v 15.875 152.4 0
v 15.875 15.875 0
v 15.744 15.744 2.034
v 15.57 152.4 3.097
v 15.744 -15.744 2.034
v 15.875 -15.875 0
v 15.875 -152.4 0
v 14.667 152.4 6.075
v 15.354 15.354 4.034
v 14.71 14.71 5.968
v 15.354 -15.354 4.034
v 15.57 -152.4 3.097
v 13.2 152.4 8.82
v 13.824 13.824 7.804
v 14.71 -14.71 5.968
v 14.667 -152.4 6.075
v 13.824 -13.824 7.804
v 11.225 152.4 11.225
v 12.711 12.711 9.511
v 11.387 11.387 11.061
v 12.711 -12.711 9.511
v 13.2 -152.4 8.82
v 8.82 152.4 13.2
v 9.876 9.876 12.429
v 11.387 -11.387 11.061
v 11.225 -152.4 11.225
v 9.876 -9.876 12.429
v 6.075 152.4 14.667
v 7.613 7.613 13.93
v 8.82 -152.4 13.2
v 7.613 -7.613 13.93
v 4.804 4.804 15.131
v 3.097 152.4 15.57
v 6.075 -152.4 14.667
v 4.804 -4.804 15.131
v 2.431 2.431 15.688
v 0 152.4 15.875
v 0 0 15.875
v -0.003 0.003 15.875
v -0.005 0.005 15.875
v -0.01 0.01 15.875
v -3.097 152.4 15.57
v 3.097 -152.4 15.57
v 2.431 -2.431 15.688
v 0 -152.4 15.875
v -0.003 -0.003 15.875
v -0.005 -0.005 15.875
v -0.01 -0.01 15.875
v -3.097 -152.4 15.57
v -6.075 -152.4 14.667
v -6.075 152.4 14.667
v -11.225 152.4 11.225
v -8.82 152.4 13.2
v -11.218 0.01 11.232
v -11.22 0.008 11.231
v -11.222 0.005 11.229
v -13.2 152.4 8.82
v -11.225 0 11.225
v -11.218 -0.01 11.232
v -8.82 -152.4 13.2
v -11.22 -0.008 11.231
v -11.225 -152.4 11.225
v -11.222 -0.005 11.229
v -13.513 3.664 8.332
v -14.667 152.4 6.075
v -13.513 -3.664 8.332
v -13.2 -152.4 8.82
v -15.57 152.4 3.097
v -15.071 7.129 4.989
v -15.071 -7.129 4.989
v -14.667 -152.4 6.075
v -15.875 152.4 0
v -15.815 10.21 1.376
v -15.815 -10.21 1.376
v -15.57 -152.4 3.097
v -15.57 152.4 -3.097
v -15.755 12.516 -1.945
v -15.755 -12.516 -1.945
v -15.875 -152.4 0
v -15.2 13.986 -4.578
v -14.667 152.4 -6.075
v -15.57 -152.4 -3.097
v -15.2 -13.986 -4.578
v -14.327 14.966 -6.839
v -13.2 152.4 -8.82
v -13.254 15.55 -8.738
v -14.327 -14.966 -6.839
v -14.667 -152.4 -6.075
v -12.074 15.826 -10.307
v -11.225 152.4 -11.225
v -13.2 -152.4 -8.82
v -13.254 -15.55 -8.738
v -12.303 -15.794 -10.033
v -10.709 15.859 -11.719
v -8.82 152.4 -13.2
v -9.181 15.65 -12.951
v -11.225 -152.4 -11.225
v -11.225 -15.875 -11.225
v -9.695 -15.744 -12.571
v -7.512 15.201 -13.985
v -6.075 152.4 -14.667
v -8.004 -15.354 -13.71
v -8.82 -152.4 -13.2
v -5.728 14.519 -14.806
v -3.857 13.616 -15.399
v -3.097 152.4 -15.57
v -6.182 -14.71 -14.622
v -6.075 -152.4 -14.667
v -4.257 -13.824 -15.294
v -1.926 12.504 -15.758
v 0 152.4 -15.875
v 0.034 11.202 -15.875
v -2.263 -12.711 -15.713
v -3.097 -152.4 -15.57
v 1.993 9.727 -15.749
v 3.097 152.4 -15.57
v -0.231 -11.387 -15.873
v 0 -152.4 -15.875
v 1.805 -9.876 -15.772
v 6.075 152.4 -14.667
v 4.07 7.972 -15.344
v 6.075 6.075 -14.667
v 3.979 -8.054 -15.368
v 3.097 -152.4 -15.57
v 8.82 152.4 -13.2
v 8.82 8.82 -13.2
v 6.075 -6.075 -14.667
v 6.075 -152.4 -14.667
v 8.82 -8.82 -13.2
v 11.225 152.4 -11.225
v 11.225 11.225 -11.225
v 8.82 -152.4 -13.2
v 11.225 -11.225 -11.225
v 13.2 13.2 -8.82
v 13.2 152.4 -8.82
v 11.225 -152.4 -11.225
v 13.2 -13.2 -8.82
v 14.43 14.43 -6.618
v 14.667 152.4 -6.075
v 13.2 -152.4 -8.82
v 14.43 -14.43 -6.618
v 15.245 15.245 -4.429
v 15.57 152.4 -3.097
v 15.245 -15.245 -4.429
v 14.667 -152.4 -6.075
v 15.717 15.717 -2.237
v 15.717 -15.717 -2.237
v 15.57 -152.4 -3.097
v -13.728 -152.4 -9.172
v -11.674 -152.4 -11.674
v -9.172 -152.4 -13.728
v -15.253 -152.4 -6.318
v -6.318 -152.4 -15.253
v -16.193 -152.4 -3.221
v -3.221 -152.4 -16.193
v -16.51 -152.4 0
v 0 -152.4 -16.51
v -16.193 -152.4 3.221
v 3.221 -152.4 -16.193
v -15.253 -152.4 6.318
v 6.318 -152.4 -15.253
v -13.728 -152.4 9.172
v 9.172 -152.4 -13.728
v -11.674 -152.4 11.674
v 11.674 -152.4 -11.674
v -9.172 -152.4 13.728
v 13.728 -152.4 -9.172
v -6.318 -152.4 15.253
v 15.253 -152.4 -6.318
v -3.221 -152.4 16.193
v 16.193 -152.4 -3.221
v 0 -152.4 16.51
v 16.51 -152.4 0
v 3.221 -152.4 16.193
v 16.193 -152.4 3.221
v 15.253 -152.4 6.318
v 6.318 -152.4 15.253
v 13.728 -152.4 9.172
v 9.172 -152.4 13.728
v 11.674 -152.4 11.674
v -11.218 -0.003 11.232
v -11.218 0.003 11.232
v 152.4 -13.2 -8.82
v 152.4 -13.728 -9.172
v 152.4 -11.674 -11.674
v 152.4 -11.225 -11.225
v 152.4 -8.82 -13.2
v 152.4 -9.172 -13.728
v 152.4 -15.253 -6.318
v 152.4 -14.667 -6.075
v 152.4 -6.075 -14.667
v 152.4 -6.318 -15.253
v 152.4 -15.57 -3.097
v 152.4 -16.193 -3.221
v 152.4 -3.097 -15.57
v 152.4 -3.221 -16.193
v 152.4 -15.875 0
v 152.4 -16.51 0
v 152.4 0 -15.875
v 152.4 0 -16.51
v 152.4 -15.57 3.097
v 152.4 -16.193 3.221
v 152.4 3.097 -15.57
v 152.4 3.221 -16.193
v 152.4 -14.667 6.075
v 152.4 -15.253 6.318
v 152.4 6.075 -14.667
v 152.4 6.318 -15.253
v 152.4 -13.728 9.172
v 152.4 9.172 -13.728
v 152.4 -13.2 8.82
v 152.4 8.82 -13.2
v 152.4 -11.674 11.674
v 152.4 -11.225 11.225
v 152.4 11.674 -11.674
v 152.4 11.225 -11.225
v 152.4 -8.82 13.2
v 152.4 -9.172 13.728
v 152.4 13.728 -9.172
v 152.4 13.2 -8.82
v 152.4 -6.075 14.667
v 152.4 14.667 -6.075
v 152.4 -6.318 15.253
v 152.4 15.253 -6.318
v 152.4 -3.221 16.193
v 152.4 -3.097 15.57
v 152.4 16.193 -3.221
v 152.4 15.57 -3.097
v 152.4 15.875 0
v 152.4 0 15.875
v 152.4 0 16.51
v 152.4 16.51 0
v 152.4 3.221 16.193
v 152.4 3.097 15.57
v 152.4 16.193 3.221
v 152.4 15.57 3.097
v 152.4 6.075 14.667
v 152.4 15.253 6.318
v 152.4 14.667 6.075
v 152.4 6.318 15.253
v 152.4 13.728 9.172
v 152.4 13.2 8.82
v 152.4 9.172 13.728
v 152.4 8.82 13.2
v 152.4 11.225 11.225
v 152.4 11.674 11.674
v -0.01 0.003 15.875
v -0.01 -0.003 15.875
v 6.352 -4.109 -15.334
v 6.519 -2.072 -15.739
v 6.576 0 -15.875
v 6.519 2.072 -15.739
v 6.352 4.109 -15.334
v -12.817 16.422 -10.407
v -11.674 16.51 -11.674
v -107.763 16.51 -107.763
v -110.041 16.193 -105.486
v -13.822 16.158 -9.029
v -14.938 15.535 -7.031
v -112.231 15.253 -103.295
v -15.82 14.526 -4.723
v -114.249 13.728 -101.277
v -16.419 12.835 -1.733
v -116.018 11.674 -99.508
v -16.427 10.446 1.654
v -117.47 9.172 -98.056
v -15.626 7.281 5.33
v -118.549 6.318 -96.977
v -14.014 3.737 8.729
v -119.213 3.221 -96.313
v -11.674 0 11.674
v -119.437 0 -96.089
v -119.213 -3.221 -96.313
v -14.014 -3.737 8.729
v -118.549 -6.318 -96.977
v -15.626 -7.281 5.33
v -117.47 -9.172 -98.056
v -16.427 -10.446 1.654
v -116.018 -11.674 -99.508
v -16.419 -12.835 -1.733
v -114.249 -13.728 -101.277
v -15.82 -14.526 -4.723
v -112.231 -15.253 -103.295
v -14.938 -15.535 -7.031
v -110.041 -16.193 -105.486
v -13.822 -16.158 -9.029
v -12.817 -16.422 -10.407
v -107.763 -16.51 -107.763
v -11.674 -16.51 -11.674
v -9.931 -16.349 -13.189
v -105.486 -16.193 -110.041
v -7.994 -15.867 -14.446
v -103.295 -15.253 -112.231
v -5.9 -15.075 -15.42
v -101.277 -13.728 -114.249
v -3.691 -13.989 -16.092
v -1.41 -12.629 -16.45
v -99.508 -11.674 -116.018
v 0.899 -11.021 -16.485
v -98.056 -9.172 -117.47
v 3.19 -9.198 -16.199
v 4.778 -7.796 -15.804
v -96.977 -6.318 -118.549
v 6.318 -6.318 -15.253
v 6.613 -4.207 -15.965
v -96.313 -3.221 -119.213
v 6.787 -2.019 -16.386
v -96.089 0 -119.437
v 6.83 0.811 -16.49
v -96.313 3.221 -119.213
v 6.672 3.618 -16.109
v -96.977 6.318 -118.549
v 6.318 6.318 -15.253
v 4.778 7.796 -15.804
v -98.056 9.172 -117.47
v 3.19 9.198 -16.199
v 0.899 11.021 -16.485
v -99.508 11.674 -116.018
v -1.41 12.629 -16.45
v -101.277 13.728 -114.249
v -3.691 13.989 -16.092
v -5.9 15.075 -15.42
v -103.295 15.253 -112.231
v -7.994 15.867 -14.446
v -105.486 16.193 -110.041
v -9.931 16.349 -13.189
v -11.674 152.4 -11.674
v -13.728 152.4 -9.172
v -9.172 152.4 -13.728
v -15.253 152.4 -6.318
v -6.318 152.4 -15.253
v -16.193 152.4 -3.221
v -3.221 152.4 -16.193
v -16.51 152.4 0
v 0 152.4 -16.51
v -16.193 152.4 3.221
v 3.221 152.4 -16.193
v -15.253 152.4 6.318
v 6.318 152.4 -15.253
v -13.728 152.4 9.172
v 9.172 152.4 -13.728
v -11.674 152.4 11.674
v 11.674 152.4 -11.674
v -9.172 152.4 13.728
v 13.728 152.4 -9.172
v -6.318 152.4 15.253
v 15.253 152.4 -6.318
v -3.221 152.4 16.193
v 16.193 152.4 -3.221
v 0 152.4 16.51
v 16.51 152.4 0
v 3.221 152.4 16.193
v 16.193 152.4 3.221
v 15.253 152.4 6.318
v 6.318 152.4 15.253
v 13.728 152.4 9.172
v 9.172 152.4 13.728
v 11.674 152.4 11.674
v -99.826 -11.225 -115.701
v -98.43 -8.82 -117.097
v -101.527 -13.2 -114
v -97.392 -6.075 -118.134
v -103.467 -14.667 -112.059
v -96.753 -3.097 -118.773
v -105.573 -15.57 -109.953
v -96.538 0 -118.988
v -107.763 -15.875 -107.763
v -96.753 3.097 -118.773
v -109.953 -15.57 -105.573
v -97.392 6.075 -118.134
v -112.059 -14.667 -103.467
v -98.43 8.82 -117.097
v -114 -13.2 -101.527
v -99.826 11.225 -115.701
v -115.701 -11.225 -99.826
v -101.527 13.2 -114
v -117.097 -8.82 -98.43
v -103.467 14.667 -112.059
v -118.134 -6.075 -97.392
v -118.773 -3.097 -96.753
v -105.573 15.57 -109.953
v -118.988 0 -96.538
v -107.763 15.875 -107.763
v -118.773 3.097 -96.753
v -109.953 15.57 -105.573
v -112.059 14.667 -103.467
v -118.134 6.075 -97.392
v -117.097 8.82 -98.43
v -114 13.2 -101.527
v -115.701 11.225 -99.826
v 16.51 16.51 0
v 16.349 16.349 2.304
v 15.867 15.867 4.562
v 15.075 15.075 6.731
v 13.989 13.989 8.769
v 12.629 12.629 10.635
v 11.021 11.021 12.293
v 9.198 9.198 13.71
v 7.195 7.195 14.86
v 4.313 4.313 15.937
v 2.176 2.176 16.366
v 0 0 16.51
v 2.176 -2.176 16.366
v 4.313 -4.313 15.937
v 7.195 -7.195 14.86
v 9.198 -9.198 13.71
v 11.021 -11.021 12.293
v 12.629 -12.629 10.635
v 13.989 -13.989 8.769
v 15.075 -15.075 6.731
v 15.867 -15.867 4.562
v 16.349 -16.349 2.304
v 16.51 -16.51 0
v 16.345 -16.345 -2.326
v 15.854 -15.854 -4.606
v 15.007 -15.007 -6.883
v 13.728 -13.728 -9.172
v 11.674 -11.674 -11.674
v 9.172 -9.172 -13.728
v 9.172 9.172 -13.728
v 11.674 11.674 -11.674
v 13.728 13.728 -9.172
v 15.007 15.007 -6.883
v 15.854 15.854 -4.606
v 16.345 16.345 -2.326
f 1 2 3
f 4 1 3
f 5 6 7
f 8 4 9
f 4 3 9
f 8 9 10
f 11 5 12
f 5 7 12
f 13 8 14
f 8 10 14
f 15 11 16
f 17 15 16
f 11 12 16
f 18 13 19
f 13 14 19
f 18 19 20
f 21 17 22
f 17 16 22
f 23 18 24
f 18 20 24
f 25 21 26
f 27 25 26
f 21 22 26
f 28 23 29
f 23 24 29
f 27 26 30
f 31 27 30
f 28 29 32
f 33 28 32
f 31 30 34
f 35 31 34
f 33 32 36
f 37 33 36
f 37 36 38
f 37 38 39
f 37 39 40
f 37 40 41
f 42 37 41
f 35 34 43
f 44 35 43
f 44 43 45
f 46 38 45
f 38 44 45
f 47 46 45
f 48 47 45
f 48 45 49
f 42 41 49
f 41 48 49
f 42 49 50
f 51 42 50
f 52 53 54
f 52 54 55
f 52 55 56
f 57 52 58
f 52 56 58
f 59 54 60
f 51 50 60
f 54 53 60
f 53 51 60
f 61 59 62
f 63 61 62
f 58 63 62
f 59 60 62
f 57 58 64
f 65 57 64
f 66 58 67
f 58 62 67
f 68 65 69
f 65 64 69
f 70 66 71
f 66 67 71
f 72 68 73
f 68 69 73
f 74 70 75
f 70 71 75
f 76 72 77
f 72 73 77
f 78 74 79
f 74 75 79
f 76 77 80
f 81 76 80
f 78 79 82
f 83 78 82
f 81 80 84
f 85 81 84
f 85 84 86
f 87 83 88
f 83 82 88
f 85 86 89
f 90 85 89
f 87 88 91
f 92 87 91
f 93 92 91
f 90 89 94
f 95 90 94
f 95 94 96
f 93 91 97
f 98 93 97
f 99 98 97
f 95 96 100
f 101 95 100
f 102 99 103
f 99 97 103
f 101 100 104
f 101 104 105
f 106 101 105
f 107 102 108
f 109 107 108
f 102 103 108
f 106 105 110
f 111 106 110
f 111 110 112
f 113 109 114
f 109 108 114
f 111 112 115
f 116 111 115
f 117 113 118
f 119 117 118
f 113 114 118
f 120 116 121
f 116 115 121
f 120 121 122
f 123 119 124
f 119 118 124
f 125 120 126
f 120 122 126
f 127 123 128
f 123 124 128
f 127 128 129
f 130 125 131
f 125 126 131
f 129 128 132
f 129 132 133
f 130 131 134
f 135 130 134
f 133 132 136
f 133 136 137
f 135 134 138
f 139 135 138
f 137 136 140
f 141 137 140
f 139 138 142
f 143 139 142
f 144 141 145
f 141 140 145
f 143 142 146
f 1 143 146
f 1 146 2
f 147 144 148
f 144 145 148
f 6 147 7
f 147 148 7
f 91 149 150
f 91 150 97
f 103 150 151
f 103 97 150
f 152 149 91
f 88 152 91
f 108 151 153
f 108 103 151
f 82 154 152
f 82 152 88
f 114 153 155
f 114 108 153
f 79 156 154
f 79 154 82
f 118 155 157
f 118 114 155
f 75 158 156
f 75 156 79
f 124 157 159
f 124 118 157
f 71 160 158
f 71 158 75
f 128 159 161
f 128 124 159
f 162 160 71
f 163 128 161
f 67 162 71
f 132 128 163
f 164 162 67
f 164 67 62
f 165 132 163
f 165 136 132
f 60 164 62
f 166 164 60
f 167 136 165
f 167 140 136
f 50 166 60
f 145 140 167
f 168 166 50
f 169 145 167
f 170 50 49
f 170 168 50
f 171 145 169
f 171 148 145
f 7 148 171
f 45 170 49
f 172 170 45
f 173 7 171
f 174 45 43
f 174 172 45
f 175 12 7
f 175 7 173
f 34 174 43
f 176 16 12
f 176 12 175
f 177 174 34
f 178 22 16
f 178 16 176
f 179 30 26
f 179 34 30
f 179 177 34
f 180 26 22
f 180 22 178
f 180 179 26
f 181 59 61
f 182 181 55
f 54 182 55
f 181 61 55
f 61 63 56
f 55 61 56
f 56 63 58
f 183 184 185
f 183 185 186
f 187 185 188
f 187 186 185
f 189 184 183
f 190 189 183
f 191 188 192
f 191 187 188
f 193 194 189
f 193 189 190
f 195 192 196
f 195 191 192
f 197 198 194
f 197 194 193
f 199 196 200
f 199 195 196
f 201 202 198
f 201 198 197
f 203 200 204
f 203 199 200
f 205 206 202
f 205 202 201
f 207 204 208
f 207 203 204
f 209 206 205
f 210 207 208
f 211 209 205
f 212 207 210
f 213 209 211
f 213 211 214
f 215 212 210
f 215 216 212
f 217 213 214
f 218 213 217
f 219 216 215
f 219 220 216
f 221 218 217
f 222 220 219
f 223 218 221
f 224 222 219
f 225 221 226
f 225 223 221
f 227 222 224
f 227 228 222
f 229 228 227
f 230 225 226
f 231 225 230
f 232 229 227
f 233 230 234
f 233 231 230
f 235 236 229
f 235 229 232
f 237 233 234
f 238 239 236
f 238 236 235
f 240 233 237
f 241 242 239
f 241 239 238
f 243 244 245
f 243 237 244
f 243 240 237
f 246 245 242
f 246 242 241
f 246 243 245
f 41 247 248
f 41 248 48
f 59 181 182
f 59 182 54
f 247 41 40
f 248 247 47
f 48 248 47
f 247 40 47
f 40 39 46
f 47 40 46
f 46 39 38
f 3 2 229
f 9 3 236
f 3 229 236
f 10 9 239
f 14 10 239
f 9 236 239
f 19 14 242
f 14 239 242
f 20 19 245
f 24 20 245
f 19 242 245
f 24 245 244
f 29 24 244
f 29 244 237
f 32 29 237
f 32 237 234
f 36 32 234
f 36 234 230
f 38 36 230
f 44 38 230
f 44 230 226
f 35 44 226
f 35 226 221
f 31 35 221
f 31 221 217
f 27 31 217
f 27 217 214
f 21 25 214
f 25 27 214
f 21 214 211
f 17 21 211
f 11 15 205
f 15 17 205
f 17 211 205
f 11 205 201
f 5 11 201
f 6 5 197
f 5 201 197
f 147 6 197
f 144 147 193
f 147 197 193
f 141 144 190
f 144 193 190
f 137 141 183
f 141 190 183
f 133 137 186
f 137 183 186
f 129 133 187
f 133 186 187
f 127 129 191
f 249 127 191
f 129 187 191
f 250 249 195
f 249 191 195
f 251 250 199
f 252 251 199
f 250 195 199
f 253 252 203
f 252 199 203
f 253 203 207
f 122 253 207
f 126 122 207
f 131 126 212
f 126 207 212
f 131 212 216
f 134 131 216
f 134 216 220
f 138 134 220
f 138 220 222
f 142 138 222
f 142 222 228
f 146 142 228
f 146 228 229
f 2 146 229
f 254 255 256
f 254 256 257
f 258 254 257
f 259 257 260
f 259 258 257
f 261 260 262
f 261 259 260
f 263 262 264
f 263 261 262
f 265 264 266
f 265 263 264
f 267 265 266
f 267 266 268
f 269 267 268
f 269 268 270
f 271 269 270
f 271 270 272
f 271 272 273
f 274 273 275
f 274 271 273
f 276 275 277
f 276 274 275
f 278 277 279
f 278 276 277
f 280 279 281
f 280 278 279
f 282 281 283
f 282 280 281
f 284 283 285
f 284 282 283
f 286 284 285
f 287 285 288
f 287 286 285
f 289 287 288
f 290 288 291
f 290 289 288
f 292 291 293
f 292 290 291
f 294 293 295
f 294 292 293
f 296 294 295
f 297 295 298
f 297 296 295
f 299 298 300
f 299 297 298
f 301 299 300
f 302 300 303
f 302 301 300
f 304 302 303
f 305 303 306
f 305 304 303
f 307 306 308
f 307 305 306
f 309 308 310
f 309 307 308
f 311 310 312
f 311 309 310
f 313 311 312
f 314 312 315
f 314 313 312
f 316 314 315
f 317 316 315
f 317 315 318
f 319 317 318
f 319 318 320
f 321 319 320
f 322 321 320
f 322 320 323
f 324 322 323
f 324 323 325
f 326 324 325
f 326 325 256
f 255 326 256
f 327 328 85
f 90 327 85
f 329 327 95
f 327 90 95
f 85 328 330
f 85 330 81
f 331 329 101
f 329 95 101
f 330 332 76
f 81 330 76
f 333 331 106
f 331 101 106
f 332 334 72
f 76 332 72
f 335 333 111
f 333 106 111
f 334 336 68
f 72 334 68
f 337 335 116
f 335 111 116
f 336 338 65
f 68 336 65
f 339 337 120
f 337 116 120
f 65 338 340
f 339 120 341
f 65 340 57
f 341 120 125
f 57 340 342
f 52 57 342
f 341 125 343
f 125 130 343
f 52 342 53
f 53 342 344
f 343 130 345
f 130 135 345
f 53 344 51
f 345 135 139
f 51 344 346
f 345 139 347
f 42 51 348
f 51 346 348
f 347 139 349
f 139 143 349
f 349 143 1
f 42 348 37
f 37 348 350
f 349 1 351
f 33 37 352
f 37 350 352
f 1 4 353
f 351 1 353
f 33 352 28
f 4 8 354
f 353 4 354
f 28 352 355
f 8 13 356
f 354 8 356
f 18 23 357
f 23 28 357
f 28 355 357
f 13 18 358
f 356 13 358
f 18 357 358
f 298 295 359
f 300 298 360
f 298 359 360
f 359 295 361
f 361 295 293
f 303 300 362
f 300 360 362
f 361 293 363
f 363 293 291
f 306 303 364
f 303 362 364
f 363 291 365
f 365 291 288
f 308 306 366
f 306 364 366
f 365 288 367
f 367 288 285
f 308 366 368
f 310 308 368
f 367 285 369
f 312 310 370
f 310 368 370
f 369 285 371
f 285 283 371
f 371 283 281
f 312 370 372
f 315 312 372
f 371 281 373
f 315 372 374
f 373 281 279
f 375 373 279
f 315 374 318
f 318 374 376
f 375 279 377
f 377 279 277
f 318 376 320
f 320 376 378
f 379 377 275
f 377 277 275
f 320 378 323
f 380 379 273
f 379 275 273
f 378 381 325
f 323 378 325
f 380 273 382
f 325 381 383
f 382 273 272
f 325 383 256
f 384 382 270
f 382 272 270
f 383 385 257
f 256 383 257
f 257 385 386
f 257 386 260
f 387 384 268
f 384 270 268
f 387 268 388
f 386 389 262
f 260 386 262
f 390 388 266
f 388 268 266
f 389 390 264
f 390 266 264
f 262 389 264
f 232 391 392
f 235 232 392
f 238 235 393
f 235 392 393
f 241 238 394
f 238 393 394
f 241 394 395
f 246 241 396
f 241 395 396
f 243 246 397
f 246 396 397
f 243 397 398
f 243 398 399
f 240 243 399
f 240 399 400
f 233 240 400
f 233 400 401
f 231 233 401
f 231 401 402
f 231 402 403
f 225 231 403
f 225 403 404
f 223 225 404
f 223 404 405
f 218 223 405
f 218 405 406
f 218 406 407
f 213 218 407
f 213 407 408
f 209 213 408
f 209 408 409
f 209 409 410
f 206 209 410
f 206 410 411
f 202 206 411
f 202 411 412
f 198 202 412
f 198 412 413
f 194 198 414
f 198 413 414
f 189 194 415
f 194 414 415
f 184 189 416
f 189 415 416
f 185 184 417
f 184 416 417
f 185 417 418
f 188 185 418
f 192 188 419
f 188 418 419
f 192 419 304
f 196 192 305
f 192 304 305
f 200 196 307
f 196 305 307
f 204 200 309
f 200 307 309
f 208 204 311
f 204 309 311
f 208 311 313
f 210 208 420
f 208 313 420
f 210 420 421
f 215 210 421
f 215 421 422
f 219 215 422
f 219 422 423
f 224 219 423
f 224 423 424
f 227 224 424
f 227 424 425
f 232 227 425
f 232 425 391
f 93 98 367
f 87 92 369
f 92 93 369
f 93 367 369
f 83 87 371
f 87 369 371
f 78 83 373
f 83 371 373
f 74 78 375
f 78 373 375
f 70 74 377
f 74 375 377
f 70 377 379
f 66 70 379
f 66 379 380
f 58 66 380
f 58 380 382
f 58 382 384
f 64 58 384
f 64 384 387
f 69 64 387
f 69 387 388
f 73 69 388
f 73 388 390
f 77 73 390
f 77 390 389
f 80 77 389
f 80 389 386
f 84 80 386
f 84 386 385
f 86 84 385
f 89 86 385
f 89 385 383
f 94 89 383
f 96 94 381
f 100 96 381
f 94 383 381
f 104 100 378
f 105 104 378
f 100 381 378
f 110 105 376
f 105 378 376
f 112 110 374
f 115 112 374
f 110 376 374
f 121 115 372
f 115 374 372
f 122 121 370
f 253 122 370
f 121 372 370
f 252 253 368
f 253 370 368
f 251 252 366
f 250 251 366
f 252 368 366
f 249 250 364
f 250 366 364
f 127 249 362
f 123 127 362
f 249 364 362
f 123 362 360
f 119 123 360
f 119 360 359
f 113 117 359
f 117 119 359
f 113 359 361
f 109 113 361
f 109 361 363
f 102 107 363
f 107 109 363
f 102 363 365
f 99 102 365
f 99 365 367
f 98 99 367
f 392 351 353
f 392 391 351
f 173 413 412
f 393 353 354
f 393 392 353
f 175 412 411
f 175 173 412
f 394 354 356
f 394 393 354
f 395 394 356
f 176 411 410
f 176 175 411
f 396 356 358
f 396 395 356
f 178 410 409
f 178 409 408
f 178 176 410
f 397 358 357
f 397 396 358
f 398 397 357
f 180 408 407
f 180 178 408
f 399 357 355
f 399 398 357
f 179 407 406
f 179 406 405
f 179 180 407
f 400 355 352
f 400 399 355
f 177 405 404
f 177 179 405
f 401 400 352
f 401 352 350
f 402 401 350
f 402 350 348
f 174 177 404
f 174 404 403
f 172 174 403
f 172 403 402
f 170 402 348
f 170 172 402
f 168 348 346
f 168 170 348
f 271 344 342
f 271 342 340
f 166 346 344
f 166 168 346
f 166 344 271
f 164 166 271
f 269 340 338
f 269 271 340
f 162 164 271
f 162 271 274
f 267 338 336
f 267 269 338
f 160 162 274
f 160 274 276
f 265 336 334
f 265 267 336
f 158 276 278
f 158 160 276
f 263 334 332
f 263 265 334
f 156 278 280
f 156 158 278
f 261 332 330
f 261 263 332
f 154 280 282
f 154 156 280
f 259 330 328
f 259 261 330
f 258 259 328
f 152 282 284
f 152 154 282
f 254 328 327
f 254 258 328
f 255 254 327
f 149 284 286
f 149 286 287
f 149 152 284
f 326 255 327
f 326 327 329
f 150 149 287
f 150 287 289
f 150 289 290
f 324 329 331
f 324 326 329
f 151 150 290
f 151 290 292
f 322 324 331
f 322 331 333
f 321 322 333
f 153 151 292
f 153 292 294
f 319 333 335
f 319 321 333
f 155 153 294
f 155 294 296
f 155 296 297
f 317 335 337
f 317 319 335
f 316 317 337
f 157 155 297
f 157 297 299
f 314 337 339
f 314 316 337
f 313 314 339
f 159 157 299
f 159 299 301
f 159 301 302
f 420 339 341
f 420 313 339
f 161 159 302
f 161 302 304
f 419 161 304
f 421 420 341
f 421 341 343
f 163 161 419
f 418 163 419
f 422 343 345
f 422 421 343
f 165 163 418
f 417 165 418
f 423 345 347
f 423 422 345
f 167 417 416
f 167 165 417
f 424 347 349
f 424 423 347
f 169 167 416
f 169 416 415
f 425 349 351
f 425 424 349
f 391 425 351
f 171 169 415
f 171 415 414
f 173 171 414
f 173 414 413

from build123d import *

# Parameters (mm, degrees)
F0_R          = 16.51
F1_DEPTH      = 152.4
F1_DEPTH_BACK = 152.4
F2_R          = 16.51
F3_DEPTH      = 152.4
F5_R          = 16.51
F6_DEPTH      = 152.4
F7_R          = 15.875
F8_DEPTH      = 304.801
F9_R          = 15.875
F10_DEPTH     = 152.41
F11_R         = 15.875
F12_DEPTH     = 152.41


with BuildPart() as f1:
    # F0 (on Front) → F1 (new body, two sides)
    with BuildSketch(Plane.XZ) as f1_sk:
        Circle(F0_R)
    extrude(amount=F1_DEPTH)
    extrude(f1_sk.sketch, amount=-F1_DEPTH_BACK)

    # F2 (on Right) → F3 (join)
    with BuildSketch(Plane.YZ):
        Circle(F2_R)
    extrude(amount=F3_DEPTH)

    # F5 (on face) → F6 (join)
    with BuildSketch(Plane(origin=(0, 0, 0), x_dir=(0, 1, 0), z_dir=(0.7071067812, 0, 0.7071067812))):
        Circle(F5_R)
    extrude(amount=-F6_DEPTH)

    # F7 (on face) → F8 (cut, through all)
    with BuildSketch(Plane.XZ.offset(152.4)):
        Circle(F7_R)
    extrude(amount=-F8_DEPTH, mode=Mode.SUBTRACT)

    # F9 (on face) → F10 (cut, up to face)
    with BuildSketch(Plane.YZ.offset(152.4)):
        Circle(F9_R)
    extrude(amount=-F10_DEPTH, mode=Mode.SUBTRACT)

    # F11 (on face) → F12 (cut, up to face)
    with BuildSketch(Plane(origin=(-107.7630734528, 0, -107.7630734528), x_dir=(0, -1, 0), z_dir=(-0.7071067812, 0, -0.7071067812))):
        Circle(F11_R)
    extrude(amount=-F12_DEPTH, mode=Mode.SUBTRACT)


solid = f1.part
